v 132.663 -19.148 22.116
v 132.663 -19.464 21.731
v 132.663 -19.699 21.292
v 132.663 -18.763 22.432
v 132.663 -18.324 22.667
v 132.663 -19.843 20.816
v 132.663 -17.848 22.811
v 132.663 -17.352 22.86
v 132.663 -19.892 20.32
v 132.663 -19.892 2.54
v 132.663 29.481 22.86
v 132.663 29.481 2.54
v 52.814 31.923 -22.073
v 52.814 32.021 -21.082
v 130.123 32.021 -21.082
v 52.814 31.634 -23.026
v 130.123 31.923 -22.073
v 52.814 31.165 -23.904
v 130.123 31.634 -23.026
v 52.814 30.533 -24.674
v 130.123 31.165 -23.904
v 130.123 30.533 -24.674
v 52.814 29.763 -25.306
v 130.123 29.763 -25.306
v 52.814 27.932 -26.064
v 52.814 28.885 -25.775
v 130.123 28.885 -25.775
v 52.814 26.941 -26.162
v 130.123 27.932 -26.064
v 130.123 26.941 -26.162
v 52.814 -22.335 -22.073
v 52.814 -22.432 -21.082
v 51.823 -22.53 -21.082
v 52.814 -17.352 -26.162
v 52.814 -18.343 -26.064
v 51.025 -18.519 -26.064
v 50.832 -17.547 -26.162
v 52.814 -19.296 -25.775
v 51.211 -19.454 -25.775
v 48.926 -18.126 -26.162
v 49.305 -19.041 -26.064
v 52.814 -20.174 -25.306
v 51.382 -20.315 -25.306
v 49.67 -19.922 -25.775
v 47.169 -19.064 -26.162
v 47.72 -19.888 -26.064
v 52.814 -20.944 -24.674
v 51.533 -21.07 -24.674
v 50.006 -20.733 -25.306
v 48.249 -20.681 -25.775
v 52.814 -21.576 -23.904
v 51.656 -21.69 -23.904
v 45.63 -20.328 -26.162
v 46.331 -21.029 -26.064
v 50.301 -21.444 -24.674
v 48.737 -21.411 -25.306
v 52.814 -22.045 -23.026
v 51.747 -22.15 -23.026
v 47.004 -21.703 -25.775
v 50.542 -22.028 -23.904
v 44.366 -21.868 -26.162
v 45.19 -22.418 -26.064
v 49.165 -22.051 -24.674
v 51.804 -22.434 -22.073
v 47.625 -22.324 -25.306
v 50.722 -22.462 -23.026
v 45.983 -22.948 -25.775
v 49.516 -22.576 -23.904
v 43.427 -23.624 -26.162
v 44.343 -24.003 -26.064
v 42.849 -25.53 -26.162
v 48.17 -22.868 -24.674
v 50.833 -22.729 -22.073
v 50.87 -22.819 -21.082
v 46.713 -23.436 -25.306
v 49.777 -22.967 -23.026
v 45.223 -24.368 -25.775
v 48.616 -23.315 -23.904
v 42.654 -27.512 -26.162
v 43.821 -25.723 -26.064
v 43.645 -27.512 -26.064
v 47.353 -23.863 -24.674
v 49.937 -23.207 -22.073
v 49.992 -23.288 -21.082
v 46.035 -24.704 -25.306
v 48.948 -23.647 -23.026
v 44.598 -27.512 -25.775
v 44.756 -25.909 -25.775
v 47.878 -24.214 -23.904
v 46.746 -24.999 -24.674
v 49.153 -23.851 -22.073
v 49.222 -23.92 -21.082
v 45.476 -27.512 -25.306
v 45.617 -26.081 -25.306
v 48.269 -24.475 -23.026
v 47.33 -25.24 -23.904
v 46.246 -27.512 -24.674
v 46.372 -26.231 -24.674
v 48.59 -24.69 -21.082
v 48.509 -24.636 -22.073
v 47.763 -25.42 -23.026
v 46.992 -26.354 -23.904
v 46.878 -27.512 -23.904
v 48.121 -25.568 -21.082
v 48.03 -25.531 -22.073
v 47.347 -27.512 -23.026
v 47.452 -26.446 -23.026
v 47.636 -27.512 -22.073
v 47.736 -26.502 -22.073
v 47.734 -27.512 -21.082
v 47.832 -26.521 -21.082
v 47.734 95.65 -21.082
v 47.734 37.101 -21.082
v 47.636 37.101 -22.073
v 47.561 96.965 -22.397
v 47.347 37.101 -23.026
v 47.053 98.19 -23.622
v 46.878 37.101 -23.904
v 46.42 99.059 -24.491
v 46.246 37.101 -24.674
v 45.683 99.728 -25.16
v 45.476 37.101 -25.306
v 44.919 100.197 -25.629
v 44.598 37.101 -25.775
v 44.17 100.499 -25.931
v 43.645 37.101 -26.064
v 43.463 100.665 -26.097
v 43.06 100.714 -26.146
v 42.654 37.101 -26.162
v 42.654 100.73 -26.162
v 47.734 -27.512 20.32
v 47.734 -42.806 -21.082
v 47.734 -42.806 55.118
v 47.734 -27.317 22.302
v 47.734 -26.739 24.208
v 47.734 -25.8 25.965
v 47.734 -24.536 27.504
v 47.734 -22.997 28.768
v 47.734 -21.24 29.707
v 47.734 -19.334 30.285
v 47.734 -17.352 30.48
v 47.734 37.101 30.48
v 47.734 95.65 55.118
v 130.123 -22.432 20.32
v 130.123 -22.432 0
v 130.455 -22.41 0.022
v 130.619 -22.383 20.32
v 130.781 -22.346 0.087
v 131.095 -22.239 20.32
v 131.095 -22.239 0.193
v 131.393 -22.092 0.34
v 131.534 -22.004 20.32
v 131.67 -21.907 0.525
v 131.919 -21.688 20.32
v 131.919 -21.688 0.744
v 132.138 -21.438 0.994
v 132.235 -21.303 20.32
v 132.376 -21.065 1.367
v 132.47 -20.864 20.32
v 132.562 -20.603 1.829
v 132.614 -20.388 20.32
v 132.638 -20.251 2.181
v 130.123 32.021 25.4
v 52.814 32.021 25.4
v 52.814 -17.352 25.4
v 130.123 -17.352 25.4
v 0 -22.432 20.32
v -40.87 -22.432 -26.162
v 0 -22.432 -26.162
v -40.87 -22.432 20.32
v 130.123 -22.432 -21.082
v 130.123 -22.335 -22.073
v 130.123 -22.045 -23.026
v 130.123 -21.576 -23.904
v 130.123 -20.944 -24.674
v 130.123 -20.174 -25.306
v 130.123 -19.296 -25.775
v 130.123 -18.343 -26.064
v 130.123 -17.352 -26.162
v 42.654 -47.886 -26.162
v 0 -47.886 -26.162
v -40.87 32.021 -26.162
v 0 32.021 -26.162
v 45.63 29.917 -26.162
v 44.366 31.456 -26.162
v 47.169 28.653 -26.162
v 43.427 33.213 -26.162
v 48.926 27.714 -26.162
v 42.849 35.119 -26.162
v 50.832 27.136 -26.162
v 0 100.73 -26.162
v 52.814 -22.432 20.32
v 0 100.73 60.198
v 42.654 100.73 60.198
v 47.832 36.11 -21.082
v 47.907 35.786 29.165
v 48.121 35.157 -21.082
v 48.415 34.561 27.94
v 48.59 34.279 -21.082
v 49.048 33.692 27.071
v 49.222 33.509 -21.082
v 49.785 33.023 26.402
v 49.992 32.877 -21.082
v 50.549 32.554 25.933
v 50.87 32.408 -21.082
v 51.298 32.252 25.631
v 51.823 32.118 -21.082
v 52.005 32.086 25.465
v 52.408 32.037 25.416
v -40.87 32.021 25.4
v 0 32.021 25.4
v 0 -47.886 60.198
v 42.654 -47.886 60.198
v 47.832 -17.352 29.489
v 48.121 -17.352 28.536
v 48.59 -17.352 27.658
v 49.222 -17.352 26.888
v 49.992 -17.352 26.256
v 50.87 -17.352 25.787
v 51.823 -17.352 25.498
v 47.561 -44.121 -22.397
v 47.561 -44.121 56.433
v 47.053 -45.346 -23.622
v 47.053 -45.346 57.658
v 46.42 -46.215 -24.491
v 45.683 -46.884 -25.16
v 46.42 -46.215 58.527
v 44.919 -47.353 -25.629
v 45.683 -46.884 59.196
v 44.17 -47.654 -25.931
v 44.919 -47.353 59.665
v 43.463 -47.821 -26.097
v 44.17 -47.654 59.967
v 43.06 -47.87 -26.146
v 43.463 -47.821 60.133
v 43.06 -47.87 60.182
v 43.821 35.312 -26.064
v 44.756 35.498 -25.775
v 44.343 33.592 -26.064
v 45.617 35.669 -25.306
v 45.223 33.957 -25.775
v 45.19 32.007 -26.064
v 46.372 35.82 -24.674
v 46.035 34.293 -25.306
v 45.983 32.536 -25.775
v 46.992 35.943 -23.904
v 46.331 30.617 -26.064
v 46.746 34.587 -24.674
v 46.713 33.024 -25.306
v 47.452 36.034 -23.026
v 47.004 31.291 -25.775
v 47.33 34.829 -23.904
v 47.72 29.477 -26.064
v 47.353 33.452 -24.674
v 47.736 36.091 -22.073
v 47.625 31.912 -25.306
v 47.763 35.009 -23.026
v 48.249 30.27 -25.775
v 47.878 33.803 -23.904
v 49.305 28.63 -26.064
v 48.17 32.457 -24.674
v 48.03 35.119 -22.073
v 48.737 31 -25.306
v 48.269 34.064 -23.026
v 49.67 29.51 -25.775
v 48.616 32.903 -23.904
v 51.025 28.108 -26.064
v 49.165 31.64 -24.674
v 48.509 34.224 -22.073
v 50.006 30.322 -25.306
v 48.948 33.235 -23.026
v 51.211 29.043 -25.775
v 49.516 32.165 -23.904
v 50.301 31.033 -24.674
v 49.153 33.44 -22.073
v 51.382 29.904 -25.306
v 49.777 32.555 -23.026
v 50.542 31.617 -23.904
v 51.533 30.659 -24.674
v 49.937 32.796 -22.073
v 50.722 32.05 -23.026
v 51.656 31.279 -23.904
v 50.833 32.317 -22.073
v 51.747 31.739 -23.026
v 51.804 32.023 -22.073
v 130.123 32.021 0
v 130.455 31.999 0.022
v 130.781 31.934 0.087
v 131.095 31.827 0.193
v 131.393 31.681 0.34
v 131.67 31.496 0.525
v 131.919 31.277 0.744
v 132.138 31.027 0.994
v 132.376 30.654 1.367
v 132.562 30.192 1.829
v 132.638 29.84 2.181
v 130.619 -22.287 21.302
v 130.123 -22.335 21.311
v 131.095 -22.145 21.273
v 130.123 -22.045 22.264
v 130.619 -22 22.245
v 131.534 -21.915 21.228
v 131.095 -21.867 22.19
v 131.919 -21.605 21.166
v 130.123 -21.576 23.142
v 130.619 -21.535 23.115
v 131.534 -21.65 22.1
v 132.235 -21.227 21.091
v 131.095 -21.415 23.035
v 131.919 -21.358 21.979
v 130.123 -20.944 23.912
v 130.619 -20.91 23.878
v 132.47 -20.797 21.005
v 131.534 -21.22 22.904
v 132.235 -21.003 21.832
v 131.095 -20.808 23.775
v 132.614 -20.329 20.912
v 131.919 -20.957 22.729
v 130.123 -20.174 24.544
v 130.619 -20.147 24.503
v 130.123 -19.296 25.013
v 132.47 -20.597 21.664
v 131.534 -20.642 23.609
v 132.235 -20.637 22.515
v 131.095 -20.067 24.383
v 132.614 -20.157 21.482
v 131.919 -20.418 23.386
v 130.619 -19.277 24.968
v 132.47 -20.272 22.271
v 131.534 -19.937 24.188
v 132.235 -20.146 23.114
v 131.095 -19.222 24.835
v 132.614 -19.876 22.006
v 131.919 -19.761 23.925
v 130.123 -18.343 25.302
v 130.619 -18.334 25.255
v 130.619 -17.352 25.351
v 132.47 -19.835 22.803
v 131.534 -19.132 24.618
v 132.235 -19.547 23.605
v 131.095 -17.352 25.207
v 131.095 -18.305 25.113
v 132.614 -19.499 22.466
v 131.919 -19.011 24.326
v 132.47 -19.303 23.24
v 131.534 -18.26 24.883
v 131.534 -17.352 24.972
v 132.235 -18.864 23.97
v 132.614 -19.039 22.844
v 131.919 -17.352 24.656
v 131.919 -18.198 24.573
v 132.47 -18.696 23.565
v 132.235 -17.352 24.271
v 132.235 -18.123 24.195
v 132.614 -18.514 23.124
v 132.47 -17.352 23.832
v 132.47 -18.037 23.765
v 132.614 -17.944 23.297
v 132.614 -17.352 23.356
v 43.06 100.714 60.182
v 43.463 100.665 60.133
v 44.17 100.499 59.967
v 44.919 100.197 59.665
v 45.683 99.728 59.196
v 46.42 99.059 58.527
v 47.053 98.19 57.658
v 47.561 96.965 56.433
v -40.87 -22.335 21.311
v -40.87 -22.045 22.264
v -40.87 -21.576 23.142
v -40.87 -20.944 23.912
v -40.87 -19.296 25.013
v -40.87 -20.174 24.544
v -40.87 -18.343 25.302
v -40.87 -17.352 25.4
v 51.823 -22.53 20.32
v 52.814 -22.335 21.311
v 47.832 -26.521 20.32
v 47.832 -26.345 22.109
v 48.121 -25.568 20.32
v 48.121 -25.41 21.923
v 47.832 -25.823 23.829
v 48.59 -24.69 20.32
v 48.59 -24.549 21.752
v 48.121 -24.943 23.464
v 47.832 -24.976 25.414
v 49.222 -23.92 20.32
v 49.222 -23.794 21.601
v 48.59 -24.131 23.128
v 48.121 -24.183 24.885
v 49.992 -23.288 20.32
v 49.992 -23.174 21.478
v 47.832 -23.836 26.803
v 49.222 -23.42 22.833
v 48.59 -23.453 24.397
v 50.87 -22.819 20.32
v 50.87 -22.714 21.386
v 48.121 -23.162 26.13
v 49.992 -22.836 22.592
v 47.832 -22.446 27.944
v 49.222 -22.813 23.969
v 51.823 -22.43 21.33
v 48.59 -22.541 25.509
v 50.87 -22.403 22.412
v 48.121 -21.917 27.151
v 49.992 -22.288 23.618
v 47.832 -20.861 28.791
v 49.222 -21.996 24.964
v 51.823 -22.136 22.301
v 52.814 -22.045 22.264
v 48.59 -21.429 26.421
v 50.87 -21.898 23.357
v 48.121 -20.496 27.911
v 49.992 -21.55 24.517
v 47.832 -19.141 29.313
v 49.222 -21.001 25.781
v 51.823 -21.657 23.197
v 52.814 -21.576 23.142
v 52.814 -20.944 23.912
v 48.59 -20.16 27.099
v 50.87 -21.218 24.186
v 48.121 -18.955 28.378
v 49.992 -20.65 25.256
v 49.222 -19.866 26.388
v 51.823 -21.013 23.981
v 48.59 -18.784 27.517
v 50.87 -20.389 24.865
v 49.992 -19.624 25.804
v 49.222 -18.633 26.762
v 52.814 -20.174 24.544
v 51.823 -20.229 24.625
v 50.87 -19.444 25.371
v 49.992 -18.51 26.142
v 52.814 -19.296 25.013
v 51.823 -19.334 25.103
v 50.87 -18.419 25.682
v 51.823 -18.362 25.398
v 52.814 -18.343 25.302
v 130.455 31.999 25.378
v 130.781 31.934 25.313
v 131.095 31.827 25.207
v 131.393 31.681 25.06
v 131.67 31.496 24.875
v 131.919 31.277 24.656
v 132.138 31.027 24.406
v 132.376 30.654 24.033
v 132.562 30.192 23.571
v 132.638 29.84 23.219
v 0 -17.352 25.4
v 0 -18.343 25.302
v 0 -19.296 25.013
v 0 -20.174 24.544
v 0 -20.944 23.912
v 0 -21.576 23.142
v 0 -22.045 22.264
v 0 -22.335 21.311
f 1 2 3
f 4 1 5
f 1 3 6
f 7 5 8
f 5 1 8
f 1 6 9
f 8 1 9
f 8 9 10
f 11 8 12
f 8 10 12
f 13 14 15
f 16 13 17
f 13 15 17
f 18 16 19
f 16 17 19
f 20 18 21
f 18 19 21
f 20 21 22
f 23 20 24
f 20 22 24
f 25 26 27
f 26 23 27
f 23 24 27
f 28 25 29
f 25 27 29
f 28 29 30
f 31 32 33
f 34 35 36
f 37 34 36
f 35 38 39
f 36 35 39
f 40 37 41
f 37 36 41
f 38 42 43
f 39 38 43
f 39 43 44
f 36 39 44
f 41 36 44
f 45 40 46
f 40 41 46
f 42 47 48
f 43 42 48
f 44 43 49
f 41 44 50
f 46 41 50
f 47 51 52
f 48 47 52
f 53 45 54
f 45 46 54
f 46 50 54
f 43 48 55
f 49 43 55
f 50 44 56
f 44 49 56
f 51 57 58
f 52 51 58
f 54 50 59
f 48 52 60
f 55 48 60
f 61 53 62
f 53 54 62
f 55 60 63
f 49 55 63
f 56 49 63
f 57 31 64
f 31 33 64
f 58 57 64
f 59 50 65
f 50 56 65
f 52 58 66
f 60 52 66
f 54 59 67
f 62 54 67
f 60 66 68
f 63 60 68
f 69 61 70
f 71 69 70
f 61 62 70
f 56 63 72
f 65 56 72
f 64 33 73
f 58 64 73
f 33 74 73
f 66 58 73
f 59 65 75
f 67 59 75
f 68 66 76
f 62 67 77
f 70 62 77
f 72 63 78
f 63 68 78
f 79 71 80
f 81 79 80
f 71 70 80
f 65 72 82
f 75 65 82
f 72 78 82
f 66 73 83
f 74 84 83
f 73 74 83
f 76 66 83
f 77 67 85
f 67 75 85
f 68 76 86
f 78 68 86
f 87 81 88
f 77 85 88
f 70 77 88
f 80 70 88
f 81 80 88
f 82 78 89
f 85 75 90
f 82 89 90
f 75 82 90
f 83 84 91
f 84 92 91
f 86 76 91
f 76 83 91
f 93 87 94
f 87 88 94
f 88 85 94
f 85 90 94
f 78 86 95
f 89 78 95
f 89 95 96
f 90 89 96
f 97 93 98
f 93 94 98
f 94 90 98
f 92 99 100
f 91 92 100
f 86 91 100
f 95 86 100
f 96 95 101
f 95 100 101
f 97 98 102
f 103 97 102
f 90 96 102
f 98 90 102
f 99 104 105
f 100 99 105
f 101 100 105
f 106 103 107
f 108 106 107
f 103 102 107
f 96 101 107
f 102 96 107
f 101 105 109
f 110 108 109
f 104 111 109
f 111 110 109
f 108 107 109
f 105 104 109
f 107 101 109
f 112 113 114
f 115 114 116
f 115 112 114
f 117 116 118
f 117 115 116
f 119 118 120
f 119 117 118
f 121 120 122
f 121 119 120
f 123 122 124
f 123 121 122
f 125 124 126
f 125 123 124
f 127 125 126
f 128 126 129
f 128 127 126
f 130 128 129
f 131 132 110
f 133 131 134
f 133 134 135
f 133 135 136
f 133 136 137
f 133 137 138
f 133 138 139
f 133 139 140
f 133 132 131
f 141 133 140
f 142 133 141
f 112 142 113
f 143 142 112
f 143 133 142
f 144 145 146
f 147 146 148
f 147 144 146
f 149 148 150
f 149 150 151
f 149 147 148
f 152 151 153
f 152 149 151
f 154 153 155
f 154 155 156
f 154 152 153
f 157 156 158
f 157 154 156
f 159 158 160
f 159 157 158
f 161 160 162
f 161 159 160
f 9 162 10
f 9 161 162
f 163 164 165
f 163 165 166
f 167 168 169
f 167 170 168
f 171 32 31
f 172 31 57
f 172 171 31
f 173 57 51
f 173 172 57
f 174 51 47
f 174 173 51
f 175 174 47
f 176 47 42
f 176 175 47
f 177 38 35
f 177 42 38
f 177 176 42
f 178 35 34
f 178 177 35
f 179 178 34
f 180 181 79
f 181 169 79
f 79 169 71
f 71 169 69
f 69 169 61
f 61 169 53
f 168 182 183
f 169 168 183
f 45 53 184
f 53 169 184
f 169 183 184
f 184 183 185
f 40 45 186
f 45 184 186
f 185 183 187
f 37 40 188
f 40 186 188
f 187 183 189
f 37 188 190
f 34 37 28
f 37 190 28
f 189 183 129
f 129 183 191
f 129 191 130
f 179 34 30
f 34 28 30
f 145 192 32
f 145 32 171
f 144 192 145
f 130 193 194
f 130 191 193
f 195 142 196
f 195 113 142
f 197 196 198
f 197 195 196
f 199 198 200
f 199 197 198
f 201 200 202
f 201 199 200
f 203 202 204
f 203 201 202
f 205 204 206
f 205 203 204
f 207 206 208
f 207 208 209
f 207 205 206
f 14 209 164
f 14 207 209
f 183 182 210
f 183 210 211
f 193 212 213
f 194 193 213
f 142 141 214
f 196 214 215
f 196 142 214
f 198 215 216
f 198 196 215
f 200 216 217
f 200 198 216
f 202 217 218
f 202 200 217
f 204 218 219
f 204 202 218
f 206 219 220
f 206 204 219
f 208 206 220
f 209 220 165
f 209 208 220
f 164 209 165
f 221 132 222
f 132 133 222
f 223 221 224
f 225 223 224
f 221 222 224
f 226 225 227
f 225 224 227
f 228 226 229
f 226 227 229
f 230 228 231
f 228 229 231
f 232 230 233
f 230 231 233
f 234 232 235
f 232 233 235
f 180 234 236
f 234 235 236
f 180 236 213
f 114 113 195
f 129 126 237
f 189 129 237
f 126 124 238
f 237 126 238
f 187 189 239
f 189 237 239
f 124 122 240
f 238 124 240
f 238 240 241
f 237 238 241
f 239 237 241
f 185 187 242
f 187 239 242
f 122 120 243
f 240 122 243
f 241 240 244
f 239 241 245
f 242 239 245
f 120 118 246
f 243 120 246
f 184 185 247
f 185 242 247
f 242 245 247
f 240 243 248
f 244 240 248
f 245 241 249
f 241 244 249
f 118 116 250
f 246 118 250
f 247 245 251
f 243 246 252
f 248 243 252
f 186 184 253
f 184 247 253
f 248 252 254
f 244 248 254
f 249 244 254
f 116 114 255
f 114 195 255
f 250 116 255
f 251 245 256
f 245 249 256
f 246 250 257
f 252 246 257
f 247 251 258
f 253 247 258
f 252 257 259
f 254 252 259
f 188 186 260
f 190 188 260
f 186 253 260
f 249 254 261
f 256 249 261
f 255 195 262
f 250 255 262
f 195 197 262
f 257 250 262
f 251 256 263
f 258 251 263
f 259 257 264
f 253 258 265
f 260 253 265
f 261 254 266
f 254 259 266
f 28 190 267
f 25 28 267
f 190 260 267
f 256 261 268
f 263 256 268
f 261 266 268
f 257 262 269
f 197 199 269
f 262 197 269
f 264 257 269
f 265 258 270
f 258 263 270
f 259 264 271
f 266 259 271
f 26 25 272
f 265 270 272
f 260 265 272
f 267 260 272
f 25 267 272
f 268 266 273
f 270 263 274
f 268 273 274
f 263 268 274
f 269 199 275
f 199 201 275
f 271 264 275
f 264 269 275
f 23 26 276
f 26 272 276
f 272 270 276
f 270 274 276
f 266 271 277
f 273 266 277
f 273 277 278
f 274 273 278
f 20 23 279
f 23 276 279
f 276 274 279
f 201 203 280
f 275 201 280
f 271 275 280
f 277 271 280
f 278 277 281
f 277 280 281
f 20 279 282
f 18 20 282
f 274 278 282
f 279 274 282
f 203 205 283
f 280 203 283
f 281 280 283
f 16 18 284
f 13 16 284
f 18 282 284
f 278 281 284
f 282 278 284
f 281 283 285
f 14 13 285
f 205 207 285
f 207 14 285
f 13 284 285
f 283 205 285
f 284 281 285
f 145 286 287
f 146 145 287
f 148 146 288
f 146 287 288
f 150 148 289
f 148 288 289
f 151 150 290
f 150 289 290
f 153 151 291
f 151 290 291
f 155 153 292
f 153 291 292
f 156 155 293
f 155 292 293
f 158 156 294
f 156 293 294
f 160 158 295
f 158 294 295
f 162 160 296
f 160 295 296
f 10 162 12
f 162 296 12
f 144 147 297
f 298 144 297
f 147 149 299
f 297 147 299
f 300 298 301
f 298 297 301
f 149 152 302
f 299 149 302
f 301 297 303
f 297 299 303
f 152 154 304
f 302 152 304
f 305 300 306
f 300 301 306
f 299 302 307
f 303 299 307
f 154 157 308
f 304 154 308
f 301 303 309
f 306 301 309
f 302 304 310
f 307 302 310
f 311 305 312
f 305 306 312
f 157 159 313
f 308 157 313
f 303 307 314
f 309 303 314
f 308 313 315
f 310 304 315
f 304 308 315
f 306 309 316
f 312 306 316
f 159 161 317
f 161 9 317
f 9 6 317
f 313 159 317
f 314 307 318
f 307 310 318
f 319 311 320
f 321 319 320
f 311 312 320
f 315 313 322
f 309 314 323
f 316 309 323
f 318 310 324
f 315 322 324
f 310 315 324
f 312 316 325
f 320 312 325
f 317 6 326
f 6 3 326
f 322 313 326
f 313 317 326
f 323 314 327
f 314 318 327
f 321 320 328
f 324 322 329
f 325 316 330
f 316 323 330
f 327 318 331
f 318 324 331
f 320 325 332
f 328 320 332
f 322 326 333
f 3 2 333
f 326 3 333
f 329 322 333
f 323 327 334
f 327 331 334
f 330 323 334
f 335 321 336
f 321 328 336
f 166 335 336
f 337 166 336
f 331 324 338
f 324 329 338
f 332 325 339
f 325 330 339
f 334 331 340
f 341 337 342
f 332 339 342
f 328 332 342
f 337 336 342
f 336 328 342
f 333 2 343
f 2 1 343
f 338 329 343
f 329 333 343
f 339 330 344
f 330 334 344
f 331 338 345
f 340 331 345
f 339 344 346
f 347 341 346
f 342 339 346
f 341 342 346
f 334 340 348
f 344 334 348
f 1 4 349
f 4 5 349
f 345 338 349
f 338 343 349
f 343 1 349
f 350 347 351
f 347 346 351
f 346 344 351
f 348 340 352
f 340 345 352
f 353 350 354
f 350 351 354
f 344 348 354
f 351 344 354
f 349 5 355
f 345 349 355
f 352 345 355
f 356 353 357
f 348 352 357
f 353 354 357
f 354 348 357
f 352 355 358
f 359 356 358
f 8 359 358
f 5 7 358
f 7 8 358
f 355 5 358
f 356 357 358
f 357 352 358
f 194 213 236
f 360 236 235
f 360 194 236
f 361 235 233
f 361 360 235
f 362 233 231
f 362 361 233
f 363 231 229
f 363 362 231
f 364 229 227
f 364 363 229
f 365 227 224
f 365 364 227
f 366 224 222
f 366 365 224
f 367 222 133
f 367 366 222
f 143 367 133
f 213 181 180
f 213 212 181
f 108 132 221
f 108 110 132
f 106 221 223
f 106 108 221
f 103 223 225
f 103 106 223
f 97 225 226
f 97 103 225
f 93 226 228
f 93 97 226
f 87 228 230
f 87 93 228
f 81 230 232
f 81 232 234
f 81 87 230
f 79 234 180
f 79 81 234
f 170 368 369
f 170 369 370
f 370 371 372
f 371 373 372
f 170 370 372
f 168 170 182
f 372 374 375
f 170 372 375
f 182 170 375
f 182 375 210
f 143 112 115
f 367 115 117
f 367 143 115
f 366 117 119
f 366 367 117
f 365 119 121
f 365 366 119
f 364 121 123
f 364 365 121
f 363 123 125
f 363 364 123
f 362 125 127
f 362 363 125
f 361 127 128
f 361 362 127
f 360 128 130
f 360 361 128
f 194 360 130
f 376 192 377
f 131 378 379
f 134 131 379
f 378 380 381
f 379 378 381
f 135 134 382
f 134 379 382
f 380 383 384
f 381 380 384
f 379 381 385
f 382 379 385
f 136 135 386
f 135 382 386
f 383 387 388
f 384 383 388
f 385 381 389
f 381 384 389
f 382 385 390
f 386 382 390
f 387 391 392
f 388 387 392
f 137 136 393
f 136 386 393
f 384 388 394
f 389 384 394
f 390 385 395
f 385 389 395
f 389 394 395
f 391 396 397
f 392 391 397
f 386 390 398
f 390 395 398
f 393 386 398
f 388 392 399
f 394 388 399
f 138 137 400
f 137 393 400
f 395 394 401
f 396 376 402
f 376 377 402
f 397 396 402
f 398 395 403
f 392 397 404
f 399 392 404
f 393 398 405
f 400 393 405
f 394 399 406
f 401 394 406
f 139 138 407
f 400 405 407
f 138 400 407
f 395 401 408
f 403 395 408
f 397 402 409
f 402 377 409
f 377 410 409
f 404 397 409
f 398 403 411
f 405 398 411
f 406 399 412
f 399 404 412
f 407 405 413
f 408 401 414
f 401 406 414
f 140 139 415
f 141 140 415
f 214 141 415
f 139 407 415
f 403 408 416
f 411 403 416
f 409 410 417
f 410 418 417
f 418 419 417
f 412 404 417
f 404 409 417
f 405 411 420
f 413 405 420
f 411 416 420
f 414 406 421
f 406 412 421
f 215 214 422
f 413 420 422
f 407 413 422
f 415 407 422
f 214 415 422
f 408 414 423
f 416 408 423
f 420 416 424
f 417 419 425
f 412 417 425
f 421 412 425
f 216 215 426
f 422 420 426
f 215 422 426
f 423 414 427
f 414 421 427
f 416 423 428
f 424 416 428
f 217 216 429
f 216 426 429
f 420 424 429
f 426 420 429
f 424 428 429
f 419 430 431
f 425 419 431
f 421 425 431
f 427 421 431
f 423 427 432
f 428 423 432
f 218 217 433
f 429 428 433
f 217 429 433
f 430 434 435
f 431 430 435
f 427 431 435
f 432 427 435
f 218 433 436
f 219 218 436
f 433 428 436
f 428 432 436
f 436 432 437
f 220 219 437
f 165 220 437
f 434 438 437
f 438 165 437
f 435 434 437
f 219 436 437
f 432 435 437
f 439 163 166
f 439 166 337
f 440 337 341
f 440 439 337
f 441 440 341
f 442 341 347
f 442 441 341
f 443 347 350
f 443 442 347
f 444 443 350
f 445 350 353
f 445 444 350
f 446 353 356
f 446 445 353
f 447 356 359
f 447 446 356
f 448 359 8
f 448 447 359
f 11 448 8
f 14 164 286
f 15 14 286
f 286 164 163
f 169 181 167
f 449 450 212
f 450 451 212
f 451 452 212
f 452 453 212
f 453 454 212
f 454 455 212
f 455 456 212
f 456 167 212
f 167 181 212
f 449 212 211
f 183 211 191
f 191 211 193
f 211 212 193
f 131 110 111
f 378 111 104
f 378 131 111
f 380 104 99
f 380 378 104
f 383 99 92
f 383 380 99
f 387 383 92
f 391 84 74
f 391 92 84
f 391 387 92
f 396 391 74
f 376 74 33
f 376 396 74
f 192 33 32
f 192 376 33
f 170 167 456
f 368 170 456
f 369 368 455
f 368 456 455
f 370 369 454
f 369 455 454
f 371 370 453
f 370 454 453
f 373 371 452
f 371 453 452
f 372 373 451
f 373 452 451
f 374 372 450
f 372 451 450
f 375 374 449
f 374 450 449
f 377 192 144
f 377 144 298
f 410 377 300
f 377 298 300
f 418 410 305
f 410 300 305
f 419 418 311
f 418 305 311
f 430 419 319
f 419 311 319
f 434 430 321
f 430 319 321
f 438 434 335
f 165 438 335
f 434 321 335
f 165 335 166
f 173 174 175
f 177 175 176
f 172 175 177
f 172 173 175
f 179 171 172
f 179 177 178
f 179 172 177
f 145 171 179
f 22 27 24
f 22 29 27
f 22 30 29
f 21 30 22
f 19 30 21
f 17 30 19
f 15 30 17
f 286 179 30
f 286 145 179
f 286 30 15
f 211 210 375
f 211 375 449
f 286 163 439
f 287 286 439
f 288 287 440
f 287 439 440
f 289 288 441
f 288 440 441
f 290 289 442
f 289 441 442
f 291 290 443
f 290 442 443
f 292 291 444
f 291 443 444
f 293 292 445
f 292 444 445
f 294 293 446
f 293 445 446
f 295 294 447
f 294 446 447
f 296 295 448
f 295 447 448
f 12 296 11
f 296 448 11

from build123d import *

# Parameters (mm, degrees)
F0_W     = 173.5329478979
F0_H     = 54.4529519975
F1_DEPTH = 25.4
F2_R     = 5.08
F3_R     = 2.54
F4_W     = 47.7339737117
F4_H     = 148.616027087
F5_DEPTH = 60.198
F6_DEPTH = 26.162
F7_R     = 5.08


with BuildPart() as f1:
    # F0 (on Top) → F1 (new body)
    with BuildSketch(Plane.XY):
        with Locations((45.8968058228, 4.7943573445)):
            Rectangle(F0_W, F0_H)
    extrude(amount=F1_DEPTH)

    # F2
    f2_edges = [f1.edges().sort_by_distance(p)[0] for p in [
        (45.896806, -22.432119, 25.4),
    ]]
    fillet(f2_edges, radius=F2_R)

    # F3
    f3_edges = [f1.edges().sort_by_distance(p)[0] for p in [
        (132.66328, -22.432119, 10.16),
        (132.66328, -20.944221, 23.912102),
        (132.66328, 4.794357, 0),
        (132.66328, 7.334357, 25.4),
        (132.66328, 32.020833, 12.7),
    ]]
    fillet(f3_edges, radius=F3_R)

    # F4 (on Top) → F5 (join)
    with BuildSketch(Plane.XY):
        with Locations((23.8669868559, 26.4220479876)):
            Rectangle(F4_W, F4_H)
    extrude(amount=F5_DEPTH)

    # F6 (add): a face of the model
    f6_faces = [f1.faces().sort_by_distance(p)[0] for p in [
        (37.8680200683, 15.9075868005, 0),
    ]]
    extrude(f6_faces, amount=F6_DEPTH)

    # F7
    f7_edges = [f1.edges().sort_by_distance(p)[0] for p in [
        (47.733974, -47.885966, 17.018),
        (47.733974, -35.159042, -26.162),
        (47.733974, -22.432119, -2.921),
        (47.733974, -20.944221, 23.912102),
        (47.733974, 7.334357, 25.4),
        (47.733974, 32.020833, -0.381),
        (47.733974, 66.375447, -26.162),
        (47.733974, 100.730062, 17.018),
        (47.733974, 26.422048, 60.198),
        (88.928627, -22.432119, -26.162),
        (88.928627, 32.020833, -26.162),
    ]]
    fillet(f7_edges, radius=F7_R)


solid = f1.part
